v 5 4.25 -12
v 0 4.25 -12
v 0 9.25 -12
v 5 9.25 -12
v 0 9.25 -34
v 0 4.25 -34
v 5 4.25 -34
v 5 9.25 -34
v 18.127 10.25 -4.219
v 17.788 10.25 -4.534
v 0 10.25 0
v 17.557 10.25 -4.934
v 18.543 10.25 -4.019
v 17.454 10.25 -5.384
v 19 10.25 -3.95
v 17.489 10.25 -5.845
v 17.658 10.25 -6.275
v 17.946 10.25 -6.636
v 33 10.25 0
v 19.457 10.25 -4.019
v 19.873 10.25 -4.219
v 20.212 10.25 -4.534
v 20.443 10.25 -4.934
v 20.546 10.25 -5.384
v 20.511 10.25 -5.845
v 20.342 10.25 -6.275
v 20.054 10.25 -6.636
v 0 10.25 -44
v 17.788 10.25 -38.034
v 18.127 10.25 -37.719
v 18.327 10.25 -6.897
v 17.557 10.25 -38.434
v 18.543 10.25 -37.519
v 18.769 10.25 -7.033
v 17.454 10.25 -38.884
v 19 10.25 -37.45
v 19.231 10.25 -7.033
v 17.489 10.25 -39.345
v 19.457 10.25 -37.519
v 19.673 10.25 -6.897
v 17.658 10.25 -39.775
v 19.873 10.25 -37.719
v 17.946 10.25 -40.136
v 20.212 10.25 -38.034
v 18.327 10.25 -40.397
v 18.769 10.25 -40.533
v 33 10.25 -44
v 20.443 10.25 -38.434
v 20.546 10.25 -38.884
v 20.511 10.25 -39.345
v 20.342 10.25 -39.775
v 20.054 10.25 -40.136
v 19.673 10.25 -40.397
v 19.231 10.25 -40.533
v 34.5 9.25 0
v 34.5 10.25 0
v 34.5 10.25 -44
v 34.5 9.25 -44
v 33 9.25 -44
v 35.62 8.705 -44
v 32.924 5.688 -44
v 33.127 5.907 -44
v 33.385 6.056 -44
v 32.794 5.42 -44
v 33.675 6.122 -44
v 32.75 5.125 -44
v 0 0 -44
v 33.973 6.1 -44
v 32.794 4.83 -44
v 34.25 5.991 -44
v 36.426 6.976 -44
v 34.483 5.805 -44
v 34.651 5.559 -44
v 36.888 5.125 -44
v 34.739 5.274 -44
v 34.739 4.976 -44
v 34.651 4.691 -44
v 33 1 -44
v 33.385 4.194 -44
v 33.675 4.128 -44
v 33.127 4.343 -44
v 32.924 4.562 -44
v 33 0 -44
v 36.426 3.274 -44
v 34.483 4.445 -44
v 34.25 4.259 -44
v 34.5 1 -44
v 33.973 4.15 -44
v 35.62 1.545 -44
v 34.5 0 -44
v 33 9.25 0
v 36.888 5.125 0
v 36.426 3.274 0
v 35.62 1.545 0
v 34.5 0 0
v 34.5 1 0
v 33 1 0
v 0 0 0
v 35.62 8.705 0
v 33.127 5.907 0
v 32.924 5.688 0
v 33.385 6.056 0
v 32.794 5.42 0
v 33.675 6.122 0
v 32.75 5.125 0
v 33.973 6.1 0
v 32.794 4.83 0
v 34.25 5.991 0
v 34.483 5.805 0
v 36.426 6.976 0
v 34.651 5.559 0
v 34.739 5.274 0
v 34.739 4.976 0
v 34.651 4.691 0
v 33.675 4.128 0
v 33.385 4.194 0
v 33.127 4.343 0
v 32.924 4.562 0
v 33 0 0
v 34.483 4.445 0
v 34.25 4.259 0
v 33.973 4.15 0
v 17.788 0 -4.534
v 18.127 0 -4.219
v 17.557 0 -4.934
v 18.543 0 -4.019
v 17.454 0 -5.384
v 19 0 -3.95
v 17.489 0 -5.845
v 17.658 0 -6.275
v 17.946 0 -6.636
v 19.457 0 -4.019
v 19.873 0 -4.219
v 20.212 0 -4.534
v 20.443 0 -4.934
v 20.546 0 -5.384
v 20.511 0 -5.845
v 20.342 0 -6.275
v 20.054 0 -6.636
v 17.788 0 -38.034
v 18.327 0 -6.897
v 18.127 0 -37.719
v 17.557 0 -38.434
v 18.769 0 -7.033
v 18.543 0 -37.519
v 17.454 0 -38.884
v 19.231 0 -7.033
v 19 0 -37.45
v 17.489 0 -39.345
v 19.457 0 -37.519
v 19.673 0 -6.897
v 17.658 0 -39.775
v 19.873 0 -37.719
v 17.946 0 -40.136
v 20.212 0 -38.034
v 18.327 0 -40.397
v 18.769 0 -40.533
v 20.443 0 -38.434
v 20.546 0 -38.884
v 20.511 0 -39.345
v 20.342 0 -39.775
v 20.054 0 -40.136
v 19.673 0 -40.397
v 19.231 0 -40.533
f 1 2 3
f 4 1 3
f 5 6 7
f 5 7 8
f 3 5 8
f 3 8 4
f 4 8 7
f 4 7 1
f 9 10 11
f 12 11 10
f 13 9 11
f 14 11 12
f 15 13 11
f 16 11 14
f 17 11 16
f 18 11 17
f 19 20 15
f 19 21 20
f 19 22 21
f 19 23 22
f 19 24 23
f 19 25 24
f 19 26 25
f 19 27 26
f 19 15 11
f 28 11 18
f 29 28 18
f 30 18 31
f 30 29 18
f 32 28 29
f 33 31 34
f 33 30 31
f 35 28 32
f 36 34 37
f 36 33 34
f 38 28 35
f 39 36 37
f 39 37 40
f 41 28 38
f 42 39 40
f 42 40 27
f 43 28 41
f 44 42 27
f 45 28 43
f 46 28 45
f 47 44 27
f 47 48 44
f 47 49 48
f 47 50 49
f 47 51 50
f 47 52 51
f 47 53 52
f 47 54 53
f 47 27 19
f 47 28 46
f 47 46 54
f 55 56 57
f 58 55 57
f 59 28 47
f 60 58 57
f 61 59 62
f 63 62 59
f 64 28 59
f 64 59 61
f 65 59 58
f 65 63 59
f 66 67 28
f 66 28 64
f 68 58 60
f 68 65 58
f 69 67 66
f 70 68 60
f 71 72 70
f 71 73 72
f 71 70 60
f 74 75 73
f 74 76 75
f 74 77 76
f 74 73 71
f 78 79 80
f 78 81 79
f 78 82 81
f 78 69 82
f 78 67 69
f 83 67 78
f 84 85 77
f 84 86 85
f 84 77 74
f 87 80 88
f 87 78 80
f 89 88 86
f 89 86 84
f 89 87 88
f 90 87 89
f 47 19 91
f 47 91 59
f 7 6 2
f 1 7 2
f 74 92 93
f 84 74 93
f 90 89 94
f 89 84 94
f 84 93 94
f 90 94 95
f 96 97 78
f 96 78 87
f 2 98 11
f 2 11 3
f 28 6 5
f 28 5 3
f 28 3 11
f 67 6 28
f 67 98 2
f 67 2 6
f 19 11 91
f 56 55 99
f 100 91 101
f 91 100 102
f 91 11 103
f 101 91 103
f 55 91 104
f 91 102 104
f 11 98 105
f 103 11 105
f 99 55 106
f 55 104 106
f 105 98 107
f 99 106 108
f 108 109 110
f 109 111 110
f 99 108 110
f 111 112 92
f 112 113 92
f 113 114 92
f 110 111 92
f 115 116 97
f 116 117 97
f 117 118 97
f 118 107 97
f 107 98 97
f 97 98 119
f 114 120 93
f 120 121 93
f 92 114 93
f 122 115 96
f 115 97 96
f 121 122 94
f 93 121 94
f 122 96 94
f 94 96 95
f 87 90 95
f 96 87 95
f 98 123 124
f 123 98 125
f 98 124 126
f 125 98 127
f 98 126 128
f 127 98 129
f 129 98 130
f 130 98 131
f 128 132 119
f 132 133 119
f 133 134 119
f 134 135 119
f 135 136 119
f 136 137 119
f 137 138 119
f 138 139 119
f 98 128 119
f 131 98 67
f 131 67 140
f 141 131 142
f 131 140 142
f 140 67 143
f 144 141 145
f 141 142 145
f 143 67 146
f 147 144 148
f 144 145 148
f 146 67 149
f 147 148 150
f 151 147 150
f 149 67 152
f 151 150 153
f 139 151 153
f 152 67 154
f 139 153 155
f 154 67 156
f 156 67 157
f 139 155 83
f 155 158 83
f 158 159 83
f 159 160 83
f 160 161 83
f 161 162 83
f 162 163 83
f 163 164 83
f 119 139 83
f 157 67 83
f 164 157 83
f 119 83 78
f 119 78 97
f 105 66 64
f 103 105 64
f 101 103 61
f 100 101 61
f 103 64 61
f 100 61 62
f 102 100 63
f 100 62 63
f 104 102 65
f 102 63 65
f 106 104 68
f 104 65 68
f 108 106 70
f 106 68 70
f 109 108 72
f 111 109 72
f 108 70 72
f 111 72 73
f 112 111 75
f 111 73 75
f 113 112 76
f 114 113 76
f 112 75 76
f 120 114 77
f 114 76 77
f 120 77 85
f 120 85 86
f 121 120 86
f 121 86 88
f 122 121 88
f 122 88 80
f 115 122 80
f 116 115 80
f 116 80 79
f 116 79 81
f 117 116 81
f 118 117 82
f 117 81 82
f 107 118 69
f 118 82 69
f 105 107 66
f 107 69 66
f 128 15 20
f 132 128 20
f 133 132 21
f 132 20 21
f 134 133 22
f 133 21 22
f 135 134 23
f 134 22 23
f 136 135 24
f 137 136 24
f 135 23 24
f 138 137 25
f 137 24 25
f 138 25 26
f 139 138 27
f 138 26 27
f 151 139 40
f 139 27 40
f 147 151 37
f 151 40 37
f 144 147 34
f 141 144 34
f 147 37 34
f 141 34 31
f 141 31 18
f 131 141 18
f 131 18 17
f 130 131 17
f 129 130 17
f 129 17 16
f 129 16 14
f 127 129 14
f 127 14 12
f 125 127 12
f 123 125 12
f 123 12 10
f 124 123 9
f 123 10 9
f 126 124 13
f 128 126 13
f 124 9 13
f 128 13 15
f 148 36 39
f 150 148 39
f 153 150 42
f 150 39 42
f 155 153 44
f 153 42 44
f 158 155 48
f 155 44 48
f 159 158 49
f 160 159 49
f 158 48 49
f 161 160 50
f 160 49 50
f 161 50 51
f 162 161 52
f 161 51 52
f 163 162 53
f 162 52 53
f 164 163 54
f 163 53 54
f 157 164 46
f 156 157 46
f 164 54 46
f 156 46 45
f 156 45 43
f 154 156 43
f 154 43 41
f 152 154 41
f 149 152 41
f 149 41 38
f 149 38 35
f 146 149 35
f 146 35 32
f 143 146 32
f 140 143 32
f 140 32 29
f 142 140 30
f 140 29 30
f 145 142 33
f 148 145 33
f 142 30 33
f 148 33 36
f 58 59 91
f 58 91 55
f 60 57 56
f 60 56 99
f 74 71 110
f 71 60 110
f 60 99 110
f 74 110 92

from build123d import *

# Parameters (mm, degrees)
CROQUIS1_W              = 37
CROQUIS1_H              = 44
SALIENTE_EXTRUIR1_DEPTH = 10.25
CROQUIS2_R              = 1.55
CORTAR_EXTRUIR1_DEPTH   = 10.25
CROQUIS3_W              = 1.5
CROQUIS3_H              = 44
CORTAR_EXTRUIR2_DEPTH   = 1
CROQUIS4_W              = 1.5
CROQUIS4_H              = 44
CORTAR_EXTRUIR3_DEPTH   = 1
CROQUIS5_R              = 1
CORTAR_EXTRUIR4_DEPTH   = 44
CROQUIS6_W              = 22
CROQUIS6_H              = 5
CORTAR_EXTRUIR5_DEPTH   = 5
REDONDEO1_R             = 10


with BuildPart() as part:
    # Croquis1 → Saliente-Extruir1 (new body)
    with BuildSketch(Plane(origin=(0, 0, 0), x_dir=(1, 0, 0), z_dir=(0, 1, 0))):
        with Locations((18.5, 22)):
            Rectangle(CROQUIS1_W, CROQUIS1_H)
    extrude(amount=SALIENTE_EXTRUIR1_DEPTH)

    # Croquis2 → Cortar-Extruir1 (cut)
    with BuildSketch(Plane(origin=(0, 10.25, 0), x_dir=(1, 0, 0), z_dir=(0, 1, 0))):
        with Locations(Location((19, 39, 0), (0, 0, 270))):
            Circle(CROQUIS2_R)
        with Locations(Location((19, 5.5, 0), (0, 0, 270))):
            Circle(CROQUIS2_R)
    extrude(amount=-CORTAR_EXTRUIR1_DEPTH, mode=Mode.SUBTRACT)

    # Croquis3 → Cortar-Extruir2 (cut)
    with BuildSketch(Plane(origin=(0, 10.25, 0), x_dir=(1, 0, 0), z_dir=(0, 1, 0))):
        with Locations((33.75, 22)):
            Rectangle(CROQUIS3_W, CROQUIS3_H)
    extrude(amount=-CORTAR_EXTRUIR2_DEPTH, mode=Mode.SUBTRACT)

    # Croquis4 → Cortar-Extruir3 (cut)
    with BuildSketch(Plane.XZ):
        with Locations((33.75, -22)):
            Rectangle(CROQUIS4_W, CROQUIS4_H)
    extrude(amount=-CORTAR_EXTRUIR3_DEPTH, mode=Mode.SUBTRACT)

    # Croquis5 → Cortar-Extruir4 (cut)
    with BuildSketch(Plane(origin=(0, 0, -44), x_dir=(-1, 0, 0), z_dir=(0, 0, -1))):
        with Locations((-33.75, 5.125)):
            Circle(CROQUIS5_R)
    extrude(amount=-CORTAR_EXTRUIR4_DEPTH, mode=Mode.SUBTRACT)

    # Croquis6 → Cortar-Extruir5 (cut)
    with BuildSketch(Plane.ZY):
        with Locations((-23, 6.75)):
            Rectangle(CROQUIS6_W, CROQUIS6_H)
    extrude(amount=-CORTAR_EXTRUIR5_DEPTH, mode=Mode.SUBTRACT)

    # Redondeo1
    # the kernel refuses this fillet: 10 mm, written as the material it takes off along each edge
    with BuildSketch(Plane(origin=(37, 0, 16.535945694), x_dir=(-1, 0, 0), z_dir=(0, 0, -1))) as redondeo1_piece_1:
        with BuildLine():
            CenterArc((10, 6.614378278), REDONDEO1_R, 180, 41.409622109)
            Line((0, 6.614378278), (-0.2, 6.614378278))
            Line((-0.2, 6.614378278), (-0.2, 0))
            Line((-0.2, 0), (0, -0.2))
            ThreePointArc((0, -0.2), (1.25, -0.2), (2.35, -0.132287566))
            Line((2.35, -0.132287566), (2.5, 0))
        make_face()
    extrude(amount=77.071891388, mode=Mode.SUBTRACT)
    with BuildSketch(Plane(origin=(37, 10.25, 16.535945694), x_dir=(0, -1, 0), z_dir=(0, 0, -1))) as redondeo1_piece_2:
        with BuildLine():
            CenterArc((6.614378278, 10), REDONDEO1_R, 228.590377891, 41.409622109)
            Line((0, 2.5), (-0.132287566, 2.35))
            ThreePointArc((-0.132287566, 2.35), (-0.2, 1.25), (-0.2, 0))
            Line((-0.2, 0), (0, -0.2))
            Line((0, -0.2), (6.614378278, -0.2))
            Line((6.614378278, -0.2), (6.614378278, 0))
        make_face()
    extrude(amount=77.071891388, mode=Mode.SUBTRACT)


solid = part.part
